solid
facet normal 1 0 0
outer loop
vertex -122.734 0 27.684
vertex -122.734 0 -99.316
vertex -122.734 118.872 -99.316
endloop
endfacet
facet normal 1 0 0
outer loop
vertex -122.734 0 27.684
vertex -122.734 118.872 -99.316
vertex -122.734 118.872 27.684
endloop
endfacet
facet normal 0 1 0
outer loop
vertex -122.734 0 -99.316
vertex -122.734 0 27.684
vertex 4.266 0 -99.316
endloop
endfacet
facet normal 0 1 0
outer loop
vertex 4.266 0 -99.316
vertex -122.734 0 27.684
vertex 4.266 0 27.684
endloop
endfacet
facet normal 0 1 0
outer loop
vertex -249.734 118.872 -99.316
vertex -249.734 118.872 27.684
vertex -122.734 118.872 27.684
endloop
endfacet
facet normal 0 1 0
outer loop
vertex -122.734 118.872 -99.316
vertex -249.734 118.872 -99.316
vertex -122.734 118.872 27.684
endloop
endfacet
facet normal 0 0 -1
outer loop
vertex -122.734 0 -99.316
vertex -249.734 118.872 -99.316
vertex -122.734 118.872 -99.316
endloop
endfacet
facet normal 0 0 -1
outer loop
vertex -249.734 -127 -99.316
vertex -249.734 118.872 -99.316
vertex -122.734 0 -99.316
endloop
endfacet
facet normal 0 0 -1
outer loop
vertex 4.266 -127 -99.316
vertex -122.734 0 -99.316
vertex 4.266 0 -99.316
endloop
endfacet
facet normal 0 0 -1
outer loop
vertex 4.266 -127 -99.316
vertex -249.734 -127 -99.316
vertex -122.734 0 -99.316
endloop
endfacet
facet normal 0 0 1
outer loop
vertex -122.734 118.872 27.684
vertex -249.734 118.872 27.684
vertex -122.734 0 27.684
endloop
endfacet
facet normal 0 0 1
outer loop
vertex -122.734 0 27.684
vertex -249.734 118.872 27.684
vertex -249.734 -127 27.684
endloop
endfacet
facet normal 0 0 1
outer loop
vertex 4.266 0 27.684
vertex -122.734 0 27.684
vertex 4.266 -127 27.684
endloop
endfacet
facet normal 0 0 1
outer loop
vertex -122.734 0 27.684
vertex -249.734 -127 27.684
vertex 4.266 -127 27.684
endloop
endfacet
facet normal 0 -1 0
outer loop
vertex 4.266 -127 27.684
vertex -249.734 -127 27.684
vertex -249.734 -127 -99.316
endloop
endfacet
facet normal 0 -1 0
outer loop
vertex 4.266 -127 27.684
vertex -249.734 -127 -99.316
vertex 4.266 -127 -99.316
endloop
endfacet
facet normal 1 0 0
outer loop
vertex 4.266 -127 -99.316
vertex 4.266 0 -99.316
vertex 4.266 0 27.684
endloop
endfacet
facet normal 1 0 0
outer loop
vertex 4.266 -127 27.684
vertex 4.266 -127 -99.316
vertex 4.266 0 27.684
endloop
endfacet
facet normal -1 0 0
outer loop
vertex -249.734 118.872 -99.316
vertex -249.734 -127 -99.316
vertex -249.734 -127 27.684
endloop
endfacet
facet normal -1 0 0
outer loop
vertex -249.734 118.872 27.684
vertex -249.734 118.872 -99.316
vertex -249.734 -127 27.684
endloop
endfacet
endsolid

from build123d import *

# Parameters (mm, degrees)
F1_W     = 127
F1_H     = 127
F2_DEPTH = 127
F3_W     = 127
F3_H     = 127
F4_DEPTH = 245.872


# Not quite as in the source:
# - a variable given as a bare number and used for a length is read in inches; the dataset says mm whatever the document's units were


with BuildPart() as f2:
    # F1 (on Front) → F2 (new body)
    with BuildSketch(Plane.XZ):
        with Locations((-59.2341877744, -35.8161340777)):
            Rectangle(F1_W, F1_H)
    extrude(amount=F2_DEPTH)

    # F3 (on face) → F4 (join)
    with BuildSketch(Plane.XZ.offset(127)):
        with Locations((-186.2341877744, -35.8161340777)):
            Rectangle(F3_W, F3_H)
    extrude(amount=-F4_DEPTH)


solid = f2.part
